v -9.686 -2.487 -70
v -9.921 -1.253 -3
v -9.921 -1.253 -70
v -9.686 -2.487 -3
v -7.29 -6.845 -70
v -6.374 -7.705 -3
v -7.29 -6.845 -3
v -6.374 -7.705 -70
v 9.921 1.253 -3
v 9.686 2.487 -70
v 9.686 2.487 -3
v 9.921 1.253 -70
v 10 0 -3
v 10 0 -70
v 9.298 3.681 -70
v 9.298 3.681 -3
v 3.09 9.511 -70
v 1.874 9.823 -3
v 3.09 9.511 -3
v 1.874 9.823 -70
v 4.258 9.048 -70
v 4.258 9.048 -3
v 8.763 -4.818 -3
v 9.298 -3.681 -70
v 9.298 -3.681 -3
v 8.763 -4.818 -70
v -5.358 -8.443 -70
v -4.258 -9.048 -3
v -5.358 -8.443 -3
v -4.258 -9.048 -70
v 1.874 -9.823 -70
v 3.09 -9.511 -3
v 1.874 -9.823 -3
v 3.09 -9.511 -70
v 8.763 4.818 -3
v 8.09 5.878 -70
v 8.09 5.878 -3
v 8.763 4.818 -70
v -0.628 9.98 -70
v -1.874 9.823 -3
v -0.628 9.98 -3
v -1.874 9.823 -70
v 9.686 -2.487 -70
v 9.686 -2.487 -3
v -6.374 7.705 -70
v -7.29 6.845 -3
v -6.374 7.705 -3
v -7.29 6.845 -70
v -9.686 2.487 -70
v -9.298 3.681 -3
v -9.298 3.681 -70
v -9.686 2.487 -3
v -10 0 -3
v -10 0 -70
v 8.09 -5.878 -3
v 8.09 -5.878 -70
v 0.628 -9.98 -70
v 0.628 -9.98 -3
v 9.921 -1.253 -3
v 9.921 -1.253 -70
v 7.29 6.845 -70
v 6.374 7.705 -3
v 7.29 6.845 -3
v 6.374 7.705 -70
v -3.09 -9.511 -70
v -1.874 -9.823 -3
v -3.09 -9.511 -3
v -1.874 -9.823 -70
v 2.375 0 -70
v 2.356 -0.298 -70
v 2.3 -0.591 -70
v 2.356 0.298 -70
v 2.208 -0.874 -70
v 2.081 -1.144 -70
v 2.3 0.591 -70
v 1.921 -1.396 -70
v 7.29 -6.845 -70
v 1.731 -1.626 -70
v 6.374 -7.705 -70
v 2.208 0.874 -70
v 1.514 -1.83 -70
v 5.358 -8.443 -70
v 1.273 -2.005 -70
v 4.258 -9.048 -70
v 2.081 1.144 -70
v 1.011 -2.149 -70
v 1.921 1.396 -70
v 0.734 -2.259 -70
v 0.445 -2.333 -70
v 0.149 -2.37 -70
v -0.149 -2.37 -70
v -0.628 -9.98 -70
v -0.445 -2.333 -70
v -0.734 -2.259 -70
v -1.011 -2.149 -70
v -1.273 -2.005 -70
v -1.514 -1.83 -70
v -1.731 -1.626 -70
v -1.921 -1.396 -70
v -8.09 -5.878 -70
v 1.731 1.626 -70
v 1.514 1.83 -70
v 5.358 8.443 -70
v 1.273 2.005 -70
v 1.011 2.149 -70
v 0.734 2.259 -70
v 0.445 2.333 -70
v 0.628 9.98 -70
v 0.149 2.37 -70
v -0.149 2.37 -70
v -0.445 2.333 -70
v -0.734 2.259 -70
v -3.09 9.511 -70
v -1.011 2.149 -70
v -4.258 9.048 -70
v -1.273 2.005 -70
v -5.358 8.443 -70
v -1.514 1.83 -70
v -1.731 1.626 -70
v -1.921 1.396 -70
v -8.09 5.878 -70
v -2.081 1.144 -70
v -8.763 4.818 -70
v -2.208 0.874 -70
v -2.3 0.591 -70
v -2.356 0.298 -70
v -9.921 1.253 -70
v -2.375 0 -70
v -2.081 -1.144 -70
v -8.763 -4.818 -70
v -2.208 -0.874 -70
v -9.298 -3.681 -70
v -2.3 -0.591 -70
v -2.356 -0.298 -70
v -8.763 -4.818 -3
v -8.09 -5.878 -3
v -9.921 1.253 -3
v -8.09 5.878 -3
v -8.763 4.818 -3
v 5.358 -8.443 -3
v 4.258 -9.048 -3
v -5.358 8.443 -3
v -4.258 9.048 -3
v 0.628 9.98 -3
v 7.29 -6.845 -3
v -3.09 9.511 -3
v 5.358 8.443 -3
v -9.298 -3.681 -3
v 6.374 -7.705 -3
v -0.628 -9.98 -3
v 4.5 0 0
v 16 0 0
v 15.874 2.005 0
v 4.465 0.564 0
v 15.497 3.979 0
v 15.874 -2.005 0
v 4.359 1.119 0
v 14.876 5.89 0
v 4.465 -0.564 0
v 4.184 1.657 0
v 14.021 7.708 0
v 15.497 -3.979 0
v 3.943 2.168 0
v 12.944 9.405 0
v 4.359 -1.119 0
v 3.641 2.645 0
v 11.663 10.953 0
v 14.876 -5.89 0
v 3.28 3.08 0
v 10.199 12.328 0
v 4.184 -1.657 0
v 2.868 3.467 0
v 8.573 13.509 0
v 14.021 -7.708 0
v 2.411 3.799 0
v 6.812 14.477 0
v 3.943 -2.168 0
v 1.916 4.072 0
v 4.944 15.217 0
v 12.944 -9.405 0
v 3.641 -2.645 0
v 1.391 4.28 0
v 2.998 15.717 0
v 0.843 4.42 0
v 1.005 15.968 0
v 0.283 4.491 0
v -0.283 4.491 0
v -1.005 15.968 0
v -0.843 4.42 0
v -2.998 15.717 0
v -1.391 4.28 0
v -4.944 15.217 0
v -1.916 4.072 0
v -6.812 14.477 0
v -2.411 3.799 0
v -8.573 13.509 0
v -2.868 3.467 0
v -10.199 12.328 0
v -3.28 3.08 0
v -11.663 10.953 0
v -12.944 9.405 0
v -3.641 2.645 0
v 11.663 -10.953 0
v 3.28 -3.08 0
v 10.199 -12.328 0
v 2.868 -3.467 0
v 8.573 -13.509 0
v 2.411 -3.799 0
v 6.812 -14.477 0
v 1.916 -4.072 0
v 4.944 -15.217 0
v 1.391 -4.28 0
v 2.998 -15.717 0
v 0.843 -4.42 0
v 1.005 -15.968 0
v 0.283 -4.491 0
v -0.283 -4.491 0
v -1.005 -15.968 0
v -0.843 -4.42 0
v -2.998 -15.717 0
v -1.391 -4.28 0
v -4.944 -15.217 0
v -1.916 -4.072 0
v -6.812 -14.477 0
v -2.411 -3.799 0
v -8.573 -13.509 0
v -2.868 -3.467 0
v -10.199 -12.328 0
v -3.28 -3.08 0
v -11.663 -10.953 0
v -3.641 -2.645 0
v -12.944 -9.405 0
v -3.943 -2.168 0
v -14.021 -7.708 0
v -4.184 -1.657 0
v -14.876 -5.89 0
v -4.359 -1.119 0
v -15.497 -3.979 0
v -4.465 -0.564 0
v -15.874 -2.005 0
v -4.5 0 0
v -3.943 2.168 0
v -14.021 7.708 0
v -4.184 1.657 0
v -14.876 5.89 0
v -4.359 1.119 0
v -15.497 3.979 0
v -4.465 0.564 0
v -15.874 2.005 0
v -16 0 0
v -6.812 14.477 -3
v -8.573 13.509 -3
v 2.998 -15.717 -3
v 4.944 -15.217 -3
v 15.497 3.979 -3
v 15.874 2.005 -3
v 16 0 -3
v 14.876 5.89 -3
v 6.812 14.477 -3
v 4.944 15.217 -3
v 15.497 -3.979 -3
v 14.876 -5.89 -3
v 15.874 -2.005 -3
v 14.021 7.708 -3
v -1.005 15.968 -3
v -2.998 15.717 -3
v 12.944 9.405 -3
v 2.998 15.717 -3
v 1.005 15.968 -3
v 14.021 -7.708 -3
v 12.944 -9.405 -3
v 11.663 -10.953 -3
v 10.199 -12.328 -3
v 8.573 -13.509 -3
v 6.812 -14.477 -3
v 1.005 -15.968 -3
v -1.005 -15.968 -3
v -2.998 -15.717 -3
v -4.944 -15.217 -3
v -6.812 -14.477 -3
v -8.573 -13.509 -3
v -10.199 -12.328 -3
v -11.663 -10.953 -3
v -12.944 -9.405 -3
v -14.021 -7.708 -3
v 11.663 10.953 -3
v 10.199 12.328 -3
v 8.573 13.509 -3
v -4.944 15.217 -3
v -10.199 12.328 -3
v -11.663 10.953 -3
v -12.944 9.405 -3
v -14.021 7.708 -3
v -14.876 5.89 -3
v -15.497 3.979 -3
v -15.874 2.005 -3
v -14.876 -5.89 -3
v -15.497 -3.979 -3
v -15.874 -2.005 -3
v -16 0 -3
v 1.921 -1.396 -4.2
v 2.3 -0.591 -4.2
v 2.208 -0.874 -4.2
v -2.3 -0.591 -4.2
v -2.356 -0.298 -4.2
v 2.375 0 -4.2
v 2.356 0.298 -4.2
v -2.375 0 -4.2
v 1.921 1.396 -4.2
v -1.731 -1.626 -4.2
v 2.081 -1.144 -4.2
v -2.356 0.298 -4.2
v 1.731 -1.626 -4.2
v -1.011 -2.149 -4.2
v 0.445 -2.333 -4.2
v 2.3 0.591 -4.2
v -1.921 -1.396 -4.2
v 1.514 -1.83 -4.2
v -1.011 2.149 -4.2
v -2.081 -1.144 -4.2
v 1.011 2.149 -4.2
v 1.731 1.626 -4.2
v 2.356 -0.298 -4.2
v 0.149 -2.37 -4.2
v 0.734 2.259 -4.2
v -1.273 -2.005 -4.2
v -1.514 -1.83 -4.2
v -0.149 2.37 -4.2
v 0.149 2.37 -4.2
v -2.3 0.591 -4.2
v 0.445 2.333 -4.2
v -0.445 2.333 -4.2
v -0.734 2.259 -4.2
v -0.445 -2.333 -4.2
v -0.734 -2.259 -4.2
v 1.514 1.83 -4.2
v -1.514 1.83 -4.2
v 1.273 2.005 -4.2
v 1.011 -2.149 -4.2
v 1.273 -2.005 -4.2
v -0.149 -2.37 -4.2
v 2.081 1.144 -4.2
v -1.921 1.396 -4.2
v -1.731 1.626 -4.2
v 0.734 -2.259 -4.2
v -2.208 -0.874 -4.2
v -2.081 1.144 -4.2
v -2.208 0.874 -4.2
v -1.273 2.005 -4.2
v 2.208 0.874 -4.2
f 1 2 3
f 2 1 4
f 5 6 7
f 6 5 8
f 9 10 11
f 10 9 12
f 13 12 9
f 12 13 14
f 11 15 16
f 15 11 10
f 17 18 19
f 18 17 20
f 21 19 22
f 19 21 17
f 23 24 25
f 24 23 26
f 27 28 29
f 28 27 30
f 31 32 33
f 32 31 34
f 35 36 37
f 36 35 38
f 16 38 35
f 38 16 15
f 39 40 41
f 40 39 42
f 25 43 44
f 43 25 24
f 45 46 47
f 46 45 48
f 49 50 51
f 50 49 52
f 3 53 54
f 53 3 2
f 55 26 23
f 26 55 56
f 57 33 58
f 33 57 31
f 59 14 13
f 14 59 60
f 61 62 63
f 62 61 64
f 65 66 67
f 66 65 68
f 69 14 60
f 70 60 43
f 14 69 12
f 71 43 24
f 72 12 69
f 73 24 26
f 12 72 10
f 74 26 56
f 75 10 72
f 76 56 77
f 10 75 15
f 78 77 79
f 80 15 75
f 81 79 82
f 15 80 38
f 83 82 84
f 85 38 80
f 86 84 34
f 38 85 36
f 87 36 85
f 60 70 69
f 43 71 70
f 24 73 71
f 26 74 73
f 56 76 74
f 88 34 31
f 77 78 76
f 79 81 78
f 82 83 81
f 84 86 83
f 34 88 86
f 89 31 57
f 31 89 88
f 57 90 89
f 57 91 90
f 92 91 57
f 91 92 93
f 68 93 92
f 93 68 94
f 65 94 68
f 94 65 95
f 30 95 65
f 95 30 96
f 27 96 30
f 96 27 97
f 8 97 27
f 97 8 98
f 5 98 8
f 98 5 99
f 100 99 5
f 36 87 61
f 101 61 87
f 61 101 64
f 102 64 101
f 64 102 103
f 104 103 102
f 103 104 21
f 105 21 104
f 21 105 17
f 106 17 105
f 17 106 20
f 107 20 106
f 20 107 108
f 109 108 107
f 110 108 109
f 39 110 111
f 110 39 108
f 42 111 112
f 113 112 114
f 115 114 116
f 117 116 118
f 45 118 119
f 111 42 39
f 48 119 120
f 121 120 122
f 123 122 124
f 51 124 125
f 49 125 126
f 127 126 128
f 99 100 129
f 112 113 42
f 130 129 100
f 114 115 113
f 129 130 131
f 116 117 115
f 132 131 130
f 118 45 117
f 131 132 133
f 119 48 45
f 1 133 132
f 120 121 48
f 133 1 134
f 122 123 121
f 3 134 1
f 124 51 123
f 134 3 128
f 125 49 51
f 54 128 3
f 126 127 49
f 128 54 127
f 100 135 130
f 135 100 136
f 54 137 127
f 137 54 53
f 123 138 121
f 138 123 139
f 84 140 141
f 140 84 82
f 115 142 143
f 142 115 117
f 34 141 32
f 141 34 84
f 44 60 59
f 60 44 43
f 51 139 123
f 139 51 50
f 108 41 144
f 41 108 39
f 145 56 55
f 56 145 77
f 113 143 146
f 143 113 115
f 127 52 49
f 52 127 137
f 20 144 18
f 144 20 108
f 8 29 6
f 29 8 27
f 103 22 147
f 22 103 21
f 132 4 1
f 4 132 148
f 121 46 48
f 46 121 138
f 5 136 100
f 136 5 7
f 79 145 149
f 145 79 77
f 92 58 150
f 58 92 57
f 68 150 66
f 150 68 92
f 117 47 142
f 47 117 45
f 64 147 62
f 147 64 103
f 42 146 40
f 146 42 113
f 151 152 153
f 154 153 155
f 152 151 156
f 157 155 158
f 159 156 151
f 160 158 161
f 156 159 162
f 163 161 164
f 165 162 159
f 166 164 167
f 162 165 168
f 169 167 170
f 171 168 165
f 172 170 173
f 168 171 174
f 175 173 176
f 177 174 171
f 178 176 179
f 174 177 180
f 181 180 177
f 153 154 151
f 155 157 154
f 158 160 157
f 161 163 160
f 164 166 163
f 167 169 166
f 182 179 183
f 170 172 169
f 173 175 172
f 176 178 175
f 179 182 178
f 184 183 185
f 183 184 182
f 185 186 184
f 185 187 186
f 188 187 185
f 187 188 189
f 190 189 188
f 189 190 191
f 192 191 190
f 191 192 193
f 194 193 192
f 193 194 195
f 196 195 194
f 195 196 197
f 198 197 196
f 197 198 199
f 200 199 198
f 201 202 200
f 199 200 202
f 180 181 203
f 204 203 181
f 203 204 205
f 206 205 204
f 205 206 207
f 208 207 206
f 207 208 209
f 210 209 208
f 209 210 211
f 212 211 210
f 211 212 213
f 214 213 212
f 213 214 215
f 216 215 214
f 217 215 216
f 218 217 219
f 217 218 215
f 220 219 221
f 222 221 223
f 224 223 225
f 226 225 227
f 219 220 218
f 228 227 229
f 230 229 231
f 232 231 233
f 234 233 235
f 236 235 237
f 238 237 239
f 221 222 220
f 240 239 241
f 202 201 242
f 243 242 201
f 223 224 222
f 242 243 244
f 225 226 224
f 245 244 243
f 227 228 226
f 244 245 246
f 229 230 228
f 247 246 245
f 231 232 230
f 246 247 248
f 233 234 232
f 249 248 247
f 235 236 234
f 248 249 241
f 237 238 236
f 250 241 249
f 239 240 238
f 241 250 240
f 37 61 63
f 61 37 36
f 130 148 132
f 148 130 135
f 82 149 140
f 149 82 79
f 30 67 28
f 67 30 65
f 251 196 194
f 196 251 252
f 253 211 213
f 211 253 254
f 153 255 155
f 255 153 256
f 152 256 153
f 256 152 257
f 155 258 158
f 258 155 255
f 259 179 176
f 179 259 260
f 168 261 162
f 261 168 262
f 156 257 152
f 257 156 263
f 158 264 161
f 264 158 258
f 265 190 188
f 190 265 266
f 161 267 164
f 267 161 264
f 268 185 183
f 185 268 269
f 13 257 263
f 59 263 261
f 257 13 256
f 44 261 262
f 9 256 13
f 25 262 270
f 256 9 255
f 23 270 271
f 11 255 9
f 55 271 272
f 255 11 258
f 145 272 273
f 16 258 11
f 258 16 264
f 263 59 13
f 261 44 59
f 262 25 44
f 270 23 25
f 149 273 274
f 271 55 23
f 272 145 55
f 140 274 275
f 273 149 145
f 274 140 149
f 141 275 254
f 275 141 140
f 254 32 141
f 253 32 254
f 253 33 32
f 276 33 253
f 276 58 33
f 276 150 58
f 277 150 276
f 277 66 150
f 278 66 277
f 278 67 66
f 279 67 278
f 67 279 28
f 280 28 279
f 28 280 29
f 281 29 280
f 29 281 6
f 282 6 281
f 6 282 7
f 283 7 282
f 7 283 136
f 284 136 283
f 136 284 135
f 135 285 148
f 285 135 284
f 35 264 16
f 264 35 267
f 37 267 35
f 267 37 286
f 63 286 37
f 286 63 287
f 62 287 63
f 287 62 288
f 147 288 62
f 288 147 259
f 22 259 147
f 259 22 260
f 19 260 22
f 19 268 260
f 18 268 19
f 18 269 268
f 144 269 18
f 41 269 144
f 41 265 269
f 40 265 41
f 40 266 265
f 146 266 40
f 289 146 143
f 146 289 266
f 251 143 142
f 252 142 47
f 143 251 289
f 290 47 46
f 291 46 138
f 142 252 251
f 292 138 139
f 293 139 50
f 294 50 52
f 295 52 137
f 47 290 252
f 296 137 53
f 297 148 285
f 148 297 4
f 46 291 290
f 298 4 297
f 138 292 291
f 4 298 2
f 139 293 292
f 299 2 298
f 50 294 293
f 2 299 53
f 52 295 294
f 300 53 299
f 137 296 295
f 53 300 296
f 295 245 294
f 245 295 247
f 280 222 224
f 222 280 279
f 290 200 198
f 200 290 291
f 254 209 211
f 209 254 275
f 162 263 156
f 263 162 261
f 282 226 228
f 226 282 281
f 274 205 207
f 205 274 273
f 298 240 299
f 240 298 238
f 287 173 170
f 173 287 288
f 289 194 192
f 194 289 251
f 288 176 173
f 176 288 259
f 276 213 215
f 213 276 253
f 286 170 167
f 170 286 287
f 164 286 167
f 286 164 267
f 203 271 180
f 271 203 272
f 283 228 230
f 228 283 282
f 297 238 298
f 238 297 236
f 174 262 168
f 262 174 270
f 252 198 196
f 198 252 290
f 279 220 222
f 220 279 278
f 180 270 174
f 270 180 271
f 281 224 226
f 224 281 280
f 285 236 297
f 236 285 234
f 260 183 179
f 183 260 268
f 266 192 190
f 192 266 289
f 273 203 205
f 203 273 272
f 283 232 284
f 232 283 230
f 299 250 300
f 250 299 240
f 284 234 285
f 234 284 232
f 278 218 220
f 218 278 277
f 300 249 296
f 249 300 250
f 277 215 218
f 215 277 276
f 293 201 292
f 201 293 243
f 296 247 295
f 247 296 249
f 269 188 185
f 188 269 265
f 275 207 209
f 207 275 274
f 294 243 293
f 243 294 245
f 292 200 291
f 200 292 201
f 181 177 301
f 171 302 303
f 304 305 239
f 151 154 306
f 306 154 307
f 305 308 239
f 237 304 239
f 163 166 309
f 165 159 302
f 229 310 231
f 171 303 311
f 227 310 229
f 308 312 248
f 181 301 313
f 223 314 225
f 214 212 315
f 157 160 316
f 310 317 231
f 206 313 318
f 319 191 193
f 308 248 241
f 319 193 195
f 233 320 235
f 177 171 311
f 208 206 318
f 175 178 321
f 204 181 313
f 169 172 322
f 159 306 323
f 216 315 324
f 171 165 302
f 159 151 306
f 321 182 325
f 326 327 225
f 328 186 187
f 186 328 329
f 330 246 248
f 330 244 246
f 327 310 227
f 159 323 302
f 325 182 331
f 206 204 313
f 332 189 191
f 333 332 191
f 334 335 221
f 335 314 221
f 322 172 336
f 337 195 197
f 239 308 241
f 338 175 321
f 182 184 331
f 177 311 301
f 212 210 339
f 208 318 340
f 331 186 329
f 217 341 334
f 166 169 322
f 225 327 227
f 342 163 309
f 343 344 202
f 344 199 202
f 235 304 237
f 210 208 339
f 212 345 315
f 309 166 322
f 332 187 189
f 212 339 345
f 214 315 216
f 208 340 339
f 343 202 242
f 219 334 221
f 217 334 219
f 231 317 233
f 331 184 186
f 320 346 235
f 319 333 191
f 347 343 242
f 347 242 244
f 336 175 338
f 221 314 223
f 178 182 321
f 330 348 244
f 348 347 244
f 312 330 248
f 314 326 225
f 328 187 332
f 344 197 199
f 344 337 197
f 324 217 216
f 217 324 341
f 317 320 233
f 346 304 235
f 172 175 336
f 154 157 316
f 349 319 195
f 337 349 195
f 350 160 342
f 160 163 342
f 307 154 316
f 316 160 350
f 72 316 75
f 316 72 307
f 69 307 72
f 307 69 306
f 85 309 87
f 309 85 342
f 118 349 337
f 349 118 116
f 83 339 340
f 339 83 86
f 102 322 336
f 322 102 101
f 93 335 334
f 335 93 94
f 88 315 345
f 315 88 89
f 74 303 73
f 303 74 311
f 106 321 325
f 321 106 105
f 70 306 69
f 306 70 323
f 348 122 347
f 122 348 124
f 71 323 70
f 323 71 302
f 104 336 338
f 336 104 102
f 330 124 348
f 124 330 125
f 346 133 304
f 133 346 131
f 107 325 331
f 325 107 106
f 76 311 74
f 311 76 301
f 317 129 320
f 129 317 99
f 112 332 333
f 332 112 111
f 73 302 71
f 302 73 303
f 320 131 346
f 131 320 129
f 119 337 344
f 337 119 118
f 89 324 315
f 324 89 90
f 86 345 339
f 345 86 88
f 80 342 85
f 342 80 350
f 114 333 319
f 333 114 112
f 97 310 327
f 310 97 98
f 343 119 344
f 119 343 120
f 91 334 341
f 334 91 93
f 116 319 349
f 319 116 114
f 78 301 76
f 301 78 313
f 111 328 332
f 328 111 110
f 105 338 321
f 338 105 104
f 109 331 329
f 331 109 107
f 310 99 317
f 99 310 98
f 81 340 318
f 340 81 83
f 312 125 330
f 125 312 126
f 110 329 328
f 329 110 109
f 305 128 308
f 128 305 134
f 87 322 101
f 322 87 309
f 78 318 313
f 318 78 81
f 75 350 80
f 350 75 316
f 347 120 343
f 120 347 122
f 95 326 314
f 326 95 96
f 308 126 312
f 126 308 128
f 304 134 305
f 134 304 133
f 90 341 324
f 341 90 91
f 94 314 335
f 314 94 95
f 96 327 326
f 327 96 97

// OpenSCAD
$fn = 50;


difference() {
	union() {
		translate(v = [0, 0, -70.0000000000]) {
			cylinder(h = 70, r = 10.0000000000);
		}
		translate(v = [0, 0, -3.0000000000]) {
			cylinder(h = 3, r = 16.0000000000);
		}
	}
	union() {
		translate(v = [0, 0, 0]) {
			rotate(a = [0, 0, 0]) {
				difference() {
					union() {
						#translate(v = [0, 0, -70.0000000000]) {
							cylinder(h = 70, r = 2.2500000000);
						}
						#translate(v = [0, 0, -4.2000000000]) {
							cylinder(h = 4.2000000000, r = 10.0000000000, r1 = 2.3750000000, r2 = 4.5000000000);
						}
						#translate(v = [0, 0, -70.0000000000]) {
							cylinder(h = 70, r = 2.3750000000);
						}
						#translate(v = [0, 0, -70.0000000000]) {
							cylinder(h = 70, r = 2.2500000000);
						}
					}
					union();
				}
			}
		}
	}
}
